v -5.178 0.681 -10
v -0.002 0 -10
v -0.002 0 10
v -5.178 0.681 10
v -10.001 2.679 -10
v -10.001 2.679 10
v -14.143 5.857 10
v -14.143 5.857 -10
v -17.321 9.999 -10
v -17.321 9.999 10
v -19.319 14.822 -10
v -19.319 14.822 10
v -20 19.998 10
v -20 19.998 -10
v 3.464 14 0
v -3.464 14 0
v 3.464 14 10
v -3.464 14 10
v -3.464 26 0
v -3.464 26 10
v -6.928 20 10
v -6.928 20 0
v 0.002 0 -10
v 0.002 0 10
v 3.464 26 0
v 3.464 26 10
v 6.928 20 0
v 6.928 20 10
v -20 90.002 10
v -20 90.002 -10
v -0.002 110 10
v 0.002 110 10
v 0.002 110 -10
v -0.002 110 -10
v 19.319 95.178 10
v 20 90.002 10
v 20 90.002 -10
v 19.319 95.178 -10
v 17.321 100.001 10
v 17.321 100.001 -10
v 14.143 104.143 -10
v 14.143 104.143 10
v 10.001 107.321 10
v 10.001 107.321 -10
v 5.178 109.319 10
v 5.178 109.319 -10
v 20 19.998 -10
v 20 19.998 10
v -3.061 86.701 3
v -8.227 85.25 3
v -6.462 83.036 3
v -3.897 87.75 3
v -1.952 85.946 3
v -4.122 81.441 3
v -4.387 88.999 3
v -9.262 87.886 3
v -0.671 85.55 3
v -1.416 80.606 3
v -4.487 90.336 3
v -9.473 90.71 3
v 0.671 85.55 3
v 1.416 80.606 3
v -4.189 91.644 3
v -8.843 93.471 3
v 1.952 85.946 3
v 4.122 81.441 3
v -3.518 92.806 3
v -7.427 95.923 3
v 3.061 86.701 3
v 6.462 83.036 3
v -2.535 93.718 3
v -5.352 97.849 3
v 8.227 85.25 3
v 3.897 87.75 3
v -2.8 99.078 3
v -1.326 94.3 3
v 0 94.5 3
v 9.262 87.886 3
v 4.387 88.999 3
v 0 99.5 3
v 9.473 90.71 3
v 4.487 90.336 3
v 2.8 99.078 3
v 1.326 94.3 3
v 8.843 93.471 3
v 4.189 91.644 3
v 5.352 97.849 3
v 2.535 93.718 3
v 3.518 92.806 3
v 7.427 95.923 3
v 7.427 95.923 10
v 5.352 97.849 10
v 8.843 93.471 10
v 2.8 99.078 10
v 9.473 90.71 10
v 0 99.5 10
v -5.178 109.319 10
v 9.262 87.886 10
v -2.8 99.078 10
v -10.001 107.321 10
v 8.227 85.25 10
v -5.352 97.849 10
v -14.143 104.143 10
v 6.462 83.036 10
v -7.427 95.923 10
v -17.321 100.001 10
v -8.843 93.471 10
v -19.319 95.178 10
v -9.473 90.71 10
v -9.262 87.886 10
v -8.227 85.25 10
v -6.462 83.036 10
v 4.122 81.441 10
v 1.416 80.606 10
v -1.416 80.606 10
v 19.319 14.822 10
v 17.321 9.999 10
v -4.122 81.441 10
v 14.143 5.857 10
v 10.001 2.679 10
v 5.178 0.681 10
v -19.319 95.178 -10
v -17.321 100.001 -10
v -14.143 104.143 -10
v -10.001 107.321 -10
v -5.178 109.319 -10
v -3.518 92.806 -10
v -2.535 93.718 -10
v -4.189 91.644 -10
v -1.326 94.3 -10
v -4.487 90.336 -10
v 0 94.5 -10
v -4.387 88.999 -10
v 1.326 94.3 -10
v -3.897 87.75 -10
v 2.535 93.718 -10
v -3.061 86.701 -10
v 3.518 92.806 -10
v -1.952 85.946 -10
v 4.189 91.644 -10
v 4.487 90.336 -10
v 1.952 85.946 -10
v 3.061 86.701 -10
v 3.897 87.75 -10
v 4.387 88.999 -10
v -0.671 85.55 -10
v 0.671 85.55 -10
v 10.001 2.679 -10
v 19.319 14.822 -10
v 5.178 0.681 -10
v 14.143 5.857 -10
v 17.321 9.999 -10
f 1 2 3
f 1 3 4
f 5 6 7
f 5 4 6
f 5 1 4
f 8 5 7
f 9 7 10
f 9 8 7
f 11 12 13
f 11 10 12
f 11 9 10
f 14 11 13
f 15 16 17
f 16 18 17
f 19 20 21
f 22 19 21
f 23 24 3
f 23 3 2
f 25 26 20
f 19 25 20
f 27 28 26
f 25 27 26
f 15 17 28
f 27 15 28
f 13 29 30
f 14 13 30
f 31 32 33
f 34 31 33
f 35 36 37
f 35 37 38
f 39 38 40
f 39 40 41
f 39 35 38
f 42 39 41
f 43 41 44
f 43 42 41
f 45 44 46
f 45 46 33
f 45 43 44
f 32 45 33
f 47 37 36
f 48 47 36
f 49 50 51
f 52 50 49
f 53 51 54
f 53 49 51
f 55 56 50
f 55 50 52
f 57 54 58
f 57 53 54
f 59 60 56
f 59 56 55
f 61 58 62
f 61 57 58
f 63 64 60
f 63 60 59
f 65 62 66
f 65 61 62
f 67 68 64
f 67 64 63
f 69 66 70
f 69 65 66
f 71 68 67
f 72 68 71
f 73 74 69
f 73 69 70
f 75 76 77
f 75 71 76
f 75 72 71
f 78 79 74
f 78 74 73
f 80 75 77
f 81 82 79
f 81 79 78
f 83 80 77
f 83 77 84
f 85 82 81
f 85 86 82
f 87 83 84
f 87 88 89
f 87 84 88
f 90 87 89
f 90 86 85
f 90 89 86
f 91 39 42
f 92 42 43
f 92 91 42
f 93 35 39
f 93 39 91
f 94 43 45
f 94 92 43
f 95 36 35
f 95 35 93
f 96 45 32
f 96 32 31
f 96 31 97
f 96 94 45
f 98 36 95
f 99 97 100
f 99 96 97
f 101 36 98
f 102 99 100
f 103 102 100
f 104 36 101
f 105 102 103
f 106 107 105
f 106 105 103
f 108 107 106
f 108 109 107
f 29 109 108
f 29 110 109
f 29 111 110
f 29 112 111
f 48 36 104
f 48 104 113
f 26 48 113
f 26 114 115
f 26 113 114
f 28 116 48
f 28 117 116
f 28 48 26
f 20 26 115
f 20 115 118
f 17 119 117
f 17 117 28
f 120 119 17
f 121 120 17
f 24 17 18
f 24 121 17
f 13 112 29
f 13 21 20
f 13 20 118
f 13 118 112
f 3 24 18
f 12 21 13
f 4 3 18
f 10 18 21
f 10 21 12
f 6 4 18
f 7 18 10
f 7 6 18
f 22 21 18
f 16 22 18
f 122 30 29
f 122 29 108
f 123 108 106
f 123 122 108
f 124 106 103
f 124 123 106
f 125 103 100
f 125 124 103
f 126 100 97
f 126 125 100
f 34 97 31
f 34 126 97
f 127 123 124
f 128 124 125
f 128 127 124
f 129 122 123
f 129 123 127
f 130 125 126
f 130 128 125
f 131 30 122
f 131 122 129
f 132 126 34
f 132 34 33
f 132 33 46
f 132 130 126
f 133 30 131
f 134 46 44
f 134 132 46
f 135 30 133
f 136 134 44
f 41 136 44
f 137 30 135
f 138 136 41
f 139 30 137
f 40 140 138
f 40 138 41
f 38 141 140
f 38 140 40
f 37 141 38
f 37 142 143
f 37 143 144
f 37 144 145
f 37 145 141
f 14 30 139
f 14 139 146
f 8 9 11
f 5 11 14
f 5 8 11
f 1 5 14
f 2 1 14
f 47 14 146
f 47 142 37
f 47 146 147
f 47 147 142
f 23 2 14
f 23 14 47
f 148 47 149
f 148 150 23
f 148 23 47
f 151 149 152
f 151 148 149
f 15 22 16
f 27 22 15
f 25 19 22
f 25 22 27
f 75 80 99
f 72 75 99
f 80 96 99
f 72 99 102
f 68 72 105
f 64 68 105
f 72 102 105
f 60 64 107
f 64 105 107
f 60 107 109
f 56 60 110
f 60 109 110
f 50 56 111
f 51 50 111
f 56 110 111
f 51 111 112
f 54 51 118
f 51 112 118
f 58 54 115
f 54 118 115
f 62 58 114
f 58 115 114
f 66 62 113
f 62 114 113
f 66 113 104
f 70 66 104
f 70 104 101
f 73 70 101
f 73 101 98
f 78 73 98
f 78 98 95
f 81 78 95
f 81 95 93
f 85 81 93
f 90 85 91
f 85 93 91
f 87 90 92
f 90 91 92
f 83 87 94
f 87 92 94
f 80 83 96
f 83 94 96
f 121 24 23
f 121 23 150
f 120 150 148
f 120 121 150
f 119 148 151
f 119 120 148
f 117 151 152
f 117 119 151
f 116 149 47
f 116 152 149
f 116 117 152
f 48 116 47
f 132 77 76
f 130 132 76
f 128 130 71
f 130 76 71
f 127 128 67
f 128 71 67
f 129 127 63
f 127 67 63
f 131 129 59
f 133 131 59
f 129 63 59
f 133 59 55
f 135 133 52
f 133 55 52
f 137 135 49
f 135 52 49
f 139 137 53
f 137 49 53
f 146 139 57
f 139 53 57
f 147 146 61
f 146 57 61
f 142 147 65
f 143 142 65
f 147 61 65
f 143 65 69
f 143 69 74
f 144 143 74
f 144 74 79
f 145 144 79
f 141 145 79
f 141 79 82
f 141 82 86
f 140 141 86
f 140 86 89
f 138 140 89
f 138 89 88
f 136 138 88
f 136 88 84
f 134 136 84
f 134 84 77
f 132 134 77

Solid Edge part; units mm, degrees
sketch "Sketch1" plane through (0, 0, 0) normal (0, -1, 0) x (1, 0, 0)
  line L0 (20, 10) -> (-20, 10)
  line L1 (-20, 10) -> (-20, -10)
  line L2 (-20, -10) -> (20, -10)
  line L3 (20, -10) -> (20, 10)
extrude "Protrusion1" add sketch "Sketch1" against normal blind 110
fillet "Redondeo_2" radius 20 4 edges at (20, 0, 0) (-20, 0, 0) (20, 110, 0) (-20, 110, 0)
sketch "Sketch2" plane through (0, 95, 10) normal (0, 0, 1) x (0, 1, 0)
  line L0 (-75, -6.9282) -> (-69, -3.4641)
  line L1 (-69, -3.4641) -> (-69, 3.4641)
  line L2 (-69, 3.4641) -> (-75, 6.9282)
  line L3 (-75, 6.9282) -> (-81, 3.4641)
  line L4 (-81, 3.4641) -> (-81, -3.4641)
  line L5 (-81, -3.4641) -> (-75, -6.9282)
extrude "VaciadoExtruido_16" cut sketch "Sketch2" against normal blind 10
sketch "Sketch3" plane through (0, 95, 10) normal (0, 0, 1) x (0, 1, 0)
  circle A0 centre (-5, 0) radius 4.5
extrude "VaciadoExtruido_17" cut sketch "Sketch3" against normal blind 52.6544
sketch "Sketch4" plane through (0, 95, 10) normal (0, 0, 1) x (0, 1, 0)
  circle A0 centre (-5, 0) radius 9.5
extrude "VaciadoExtruido_18" cut sketch "Sketch4" against normal blind 7
